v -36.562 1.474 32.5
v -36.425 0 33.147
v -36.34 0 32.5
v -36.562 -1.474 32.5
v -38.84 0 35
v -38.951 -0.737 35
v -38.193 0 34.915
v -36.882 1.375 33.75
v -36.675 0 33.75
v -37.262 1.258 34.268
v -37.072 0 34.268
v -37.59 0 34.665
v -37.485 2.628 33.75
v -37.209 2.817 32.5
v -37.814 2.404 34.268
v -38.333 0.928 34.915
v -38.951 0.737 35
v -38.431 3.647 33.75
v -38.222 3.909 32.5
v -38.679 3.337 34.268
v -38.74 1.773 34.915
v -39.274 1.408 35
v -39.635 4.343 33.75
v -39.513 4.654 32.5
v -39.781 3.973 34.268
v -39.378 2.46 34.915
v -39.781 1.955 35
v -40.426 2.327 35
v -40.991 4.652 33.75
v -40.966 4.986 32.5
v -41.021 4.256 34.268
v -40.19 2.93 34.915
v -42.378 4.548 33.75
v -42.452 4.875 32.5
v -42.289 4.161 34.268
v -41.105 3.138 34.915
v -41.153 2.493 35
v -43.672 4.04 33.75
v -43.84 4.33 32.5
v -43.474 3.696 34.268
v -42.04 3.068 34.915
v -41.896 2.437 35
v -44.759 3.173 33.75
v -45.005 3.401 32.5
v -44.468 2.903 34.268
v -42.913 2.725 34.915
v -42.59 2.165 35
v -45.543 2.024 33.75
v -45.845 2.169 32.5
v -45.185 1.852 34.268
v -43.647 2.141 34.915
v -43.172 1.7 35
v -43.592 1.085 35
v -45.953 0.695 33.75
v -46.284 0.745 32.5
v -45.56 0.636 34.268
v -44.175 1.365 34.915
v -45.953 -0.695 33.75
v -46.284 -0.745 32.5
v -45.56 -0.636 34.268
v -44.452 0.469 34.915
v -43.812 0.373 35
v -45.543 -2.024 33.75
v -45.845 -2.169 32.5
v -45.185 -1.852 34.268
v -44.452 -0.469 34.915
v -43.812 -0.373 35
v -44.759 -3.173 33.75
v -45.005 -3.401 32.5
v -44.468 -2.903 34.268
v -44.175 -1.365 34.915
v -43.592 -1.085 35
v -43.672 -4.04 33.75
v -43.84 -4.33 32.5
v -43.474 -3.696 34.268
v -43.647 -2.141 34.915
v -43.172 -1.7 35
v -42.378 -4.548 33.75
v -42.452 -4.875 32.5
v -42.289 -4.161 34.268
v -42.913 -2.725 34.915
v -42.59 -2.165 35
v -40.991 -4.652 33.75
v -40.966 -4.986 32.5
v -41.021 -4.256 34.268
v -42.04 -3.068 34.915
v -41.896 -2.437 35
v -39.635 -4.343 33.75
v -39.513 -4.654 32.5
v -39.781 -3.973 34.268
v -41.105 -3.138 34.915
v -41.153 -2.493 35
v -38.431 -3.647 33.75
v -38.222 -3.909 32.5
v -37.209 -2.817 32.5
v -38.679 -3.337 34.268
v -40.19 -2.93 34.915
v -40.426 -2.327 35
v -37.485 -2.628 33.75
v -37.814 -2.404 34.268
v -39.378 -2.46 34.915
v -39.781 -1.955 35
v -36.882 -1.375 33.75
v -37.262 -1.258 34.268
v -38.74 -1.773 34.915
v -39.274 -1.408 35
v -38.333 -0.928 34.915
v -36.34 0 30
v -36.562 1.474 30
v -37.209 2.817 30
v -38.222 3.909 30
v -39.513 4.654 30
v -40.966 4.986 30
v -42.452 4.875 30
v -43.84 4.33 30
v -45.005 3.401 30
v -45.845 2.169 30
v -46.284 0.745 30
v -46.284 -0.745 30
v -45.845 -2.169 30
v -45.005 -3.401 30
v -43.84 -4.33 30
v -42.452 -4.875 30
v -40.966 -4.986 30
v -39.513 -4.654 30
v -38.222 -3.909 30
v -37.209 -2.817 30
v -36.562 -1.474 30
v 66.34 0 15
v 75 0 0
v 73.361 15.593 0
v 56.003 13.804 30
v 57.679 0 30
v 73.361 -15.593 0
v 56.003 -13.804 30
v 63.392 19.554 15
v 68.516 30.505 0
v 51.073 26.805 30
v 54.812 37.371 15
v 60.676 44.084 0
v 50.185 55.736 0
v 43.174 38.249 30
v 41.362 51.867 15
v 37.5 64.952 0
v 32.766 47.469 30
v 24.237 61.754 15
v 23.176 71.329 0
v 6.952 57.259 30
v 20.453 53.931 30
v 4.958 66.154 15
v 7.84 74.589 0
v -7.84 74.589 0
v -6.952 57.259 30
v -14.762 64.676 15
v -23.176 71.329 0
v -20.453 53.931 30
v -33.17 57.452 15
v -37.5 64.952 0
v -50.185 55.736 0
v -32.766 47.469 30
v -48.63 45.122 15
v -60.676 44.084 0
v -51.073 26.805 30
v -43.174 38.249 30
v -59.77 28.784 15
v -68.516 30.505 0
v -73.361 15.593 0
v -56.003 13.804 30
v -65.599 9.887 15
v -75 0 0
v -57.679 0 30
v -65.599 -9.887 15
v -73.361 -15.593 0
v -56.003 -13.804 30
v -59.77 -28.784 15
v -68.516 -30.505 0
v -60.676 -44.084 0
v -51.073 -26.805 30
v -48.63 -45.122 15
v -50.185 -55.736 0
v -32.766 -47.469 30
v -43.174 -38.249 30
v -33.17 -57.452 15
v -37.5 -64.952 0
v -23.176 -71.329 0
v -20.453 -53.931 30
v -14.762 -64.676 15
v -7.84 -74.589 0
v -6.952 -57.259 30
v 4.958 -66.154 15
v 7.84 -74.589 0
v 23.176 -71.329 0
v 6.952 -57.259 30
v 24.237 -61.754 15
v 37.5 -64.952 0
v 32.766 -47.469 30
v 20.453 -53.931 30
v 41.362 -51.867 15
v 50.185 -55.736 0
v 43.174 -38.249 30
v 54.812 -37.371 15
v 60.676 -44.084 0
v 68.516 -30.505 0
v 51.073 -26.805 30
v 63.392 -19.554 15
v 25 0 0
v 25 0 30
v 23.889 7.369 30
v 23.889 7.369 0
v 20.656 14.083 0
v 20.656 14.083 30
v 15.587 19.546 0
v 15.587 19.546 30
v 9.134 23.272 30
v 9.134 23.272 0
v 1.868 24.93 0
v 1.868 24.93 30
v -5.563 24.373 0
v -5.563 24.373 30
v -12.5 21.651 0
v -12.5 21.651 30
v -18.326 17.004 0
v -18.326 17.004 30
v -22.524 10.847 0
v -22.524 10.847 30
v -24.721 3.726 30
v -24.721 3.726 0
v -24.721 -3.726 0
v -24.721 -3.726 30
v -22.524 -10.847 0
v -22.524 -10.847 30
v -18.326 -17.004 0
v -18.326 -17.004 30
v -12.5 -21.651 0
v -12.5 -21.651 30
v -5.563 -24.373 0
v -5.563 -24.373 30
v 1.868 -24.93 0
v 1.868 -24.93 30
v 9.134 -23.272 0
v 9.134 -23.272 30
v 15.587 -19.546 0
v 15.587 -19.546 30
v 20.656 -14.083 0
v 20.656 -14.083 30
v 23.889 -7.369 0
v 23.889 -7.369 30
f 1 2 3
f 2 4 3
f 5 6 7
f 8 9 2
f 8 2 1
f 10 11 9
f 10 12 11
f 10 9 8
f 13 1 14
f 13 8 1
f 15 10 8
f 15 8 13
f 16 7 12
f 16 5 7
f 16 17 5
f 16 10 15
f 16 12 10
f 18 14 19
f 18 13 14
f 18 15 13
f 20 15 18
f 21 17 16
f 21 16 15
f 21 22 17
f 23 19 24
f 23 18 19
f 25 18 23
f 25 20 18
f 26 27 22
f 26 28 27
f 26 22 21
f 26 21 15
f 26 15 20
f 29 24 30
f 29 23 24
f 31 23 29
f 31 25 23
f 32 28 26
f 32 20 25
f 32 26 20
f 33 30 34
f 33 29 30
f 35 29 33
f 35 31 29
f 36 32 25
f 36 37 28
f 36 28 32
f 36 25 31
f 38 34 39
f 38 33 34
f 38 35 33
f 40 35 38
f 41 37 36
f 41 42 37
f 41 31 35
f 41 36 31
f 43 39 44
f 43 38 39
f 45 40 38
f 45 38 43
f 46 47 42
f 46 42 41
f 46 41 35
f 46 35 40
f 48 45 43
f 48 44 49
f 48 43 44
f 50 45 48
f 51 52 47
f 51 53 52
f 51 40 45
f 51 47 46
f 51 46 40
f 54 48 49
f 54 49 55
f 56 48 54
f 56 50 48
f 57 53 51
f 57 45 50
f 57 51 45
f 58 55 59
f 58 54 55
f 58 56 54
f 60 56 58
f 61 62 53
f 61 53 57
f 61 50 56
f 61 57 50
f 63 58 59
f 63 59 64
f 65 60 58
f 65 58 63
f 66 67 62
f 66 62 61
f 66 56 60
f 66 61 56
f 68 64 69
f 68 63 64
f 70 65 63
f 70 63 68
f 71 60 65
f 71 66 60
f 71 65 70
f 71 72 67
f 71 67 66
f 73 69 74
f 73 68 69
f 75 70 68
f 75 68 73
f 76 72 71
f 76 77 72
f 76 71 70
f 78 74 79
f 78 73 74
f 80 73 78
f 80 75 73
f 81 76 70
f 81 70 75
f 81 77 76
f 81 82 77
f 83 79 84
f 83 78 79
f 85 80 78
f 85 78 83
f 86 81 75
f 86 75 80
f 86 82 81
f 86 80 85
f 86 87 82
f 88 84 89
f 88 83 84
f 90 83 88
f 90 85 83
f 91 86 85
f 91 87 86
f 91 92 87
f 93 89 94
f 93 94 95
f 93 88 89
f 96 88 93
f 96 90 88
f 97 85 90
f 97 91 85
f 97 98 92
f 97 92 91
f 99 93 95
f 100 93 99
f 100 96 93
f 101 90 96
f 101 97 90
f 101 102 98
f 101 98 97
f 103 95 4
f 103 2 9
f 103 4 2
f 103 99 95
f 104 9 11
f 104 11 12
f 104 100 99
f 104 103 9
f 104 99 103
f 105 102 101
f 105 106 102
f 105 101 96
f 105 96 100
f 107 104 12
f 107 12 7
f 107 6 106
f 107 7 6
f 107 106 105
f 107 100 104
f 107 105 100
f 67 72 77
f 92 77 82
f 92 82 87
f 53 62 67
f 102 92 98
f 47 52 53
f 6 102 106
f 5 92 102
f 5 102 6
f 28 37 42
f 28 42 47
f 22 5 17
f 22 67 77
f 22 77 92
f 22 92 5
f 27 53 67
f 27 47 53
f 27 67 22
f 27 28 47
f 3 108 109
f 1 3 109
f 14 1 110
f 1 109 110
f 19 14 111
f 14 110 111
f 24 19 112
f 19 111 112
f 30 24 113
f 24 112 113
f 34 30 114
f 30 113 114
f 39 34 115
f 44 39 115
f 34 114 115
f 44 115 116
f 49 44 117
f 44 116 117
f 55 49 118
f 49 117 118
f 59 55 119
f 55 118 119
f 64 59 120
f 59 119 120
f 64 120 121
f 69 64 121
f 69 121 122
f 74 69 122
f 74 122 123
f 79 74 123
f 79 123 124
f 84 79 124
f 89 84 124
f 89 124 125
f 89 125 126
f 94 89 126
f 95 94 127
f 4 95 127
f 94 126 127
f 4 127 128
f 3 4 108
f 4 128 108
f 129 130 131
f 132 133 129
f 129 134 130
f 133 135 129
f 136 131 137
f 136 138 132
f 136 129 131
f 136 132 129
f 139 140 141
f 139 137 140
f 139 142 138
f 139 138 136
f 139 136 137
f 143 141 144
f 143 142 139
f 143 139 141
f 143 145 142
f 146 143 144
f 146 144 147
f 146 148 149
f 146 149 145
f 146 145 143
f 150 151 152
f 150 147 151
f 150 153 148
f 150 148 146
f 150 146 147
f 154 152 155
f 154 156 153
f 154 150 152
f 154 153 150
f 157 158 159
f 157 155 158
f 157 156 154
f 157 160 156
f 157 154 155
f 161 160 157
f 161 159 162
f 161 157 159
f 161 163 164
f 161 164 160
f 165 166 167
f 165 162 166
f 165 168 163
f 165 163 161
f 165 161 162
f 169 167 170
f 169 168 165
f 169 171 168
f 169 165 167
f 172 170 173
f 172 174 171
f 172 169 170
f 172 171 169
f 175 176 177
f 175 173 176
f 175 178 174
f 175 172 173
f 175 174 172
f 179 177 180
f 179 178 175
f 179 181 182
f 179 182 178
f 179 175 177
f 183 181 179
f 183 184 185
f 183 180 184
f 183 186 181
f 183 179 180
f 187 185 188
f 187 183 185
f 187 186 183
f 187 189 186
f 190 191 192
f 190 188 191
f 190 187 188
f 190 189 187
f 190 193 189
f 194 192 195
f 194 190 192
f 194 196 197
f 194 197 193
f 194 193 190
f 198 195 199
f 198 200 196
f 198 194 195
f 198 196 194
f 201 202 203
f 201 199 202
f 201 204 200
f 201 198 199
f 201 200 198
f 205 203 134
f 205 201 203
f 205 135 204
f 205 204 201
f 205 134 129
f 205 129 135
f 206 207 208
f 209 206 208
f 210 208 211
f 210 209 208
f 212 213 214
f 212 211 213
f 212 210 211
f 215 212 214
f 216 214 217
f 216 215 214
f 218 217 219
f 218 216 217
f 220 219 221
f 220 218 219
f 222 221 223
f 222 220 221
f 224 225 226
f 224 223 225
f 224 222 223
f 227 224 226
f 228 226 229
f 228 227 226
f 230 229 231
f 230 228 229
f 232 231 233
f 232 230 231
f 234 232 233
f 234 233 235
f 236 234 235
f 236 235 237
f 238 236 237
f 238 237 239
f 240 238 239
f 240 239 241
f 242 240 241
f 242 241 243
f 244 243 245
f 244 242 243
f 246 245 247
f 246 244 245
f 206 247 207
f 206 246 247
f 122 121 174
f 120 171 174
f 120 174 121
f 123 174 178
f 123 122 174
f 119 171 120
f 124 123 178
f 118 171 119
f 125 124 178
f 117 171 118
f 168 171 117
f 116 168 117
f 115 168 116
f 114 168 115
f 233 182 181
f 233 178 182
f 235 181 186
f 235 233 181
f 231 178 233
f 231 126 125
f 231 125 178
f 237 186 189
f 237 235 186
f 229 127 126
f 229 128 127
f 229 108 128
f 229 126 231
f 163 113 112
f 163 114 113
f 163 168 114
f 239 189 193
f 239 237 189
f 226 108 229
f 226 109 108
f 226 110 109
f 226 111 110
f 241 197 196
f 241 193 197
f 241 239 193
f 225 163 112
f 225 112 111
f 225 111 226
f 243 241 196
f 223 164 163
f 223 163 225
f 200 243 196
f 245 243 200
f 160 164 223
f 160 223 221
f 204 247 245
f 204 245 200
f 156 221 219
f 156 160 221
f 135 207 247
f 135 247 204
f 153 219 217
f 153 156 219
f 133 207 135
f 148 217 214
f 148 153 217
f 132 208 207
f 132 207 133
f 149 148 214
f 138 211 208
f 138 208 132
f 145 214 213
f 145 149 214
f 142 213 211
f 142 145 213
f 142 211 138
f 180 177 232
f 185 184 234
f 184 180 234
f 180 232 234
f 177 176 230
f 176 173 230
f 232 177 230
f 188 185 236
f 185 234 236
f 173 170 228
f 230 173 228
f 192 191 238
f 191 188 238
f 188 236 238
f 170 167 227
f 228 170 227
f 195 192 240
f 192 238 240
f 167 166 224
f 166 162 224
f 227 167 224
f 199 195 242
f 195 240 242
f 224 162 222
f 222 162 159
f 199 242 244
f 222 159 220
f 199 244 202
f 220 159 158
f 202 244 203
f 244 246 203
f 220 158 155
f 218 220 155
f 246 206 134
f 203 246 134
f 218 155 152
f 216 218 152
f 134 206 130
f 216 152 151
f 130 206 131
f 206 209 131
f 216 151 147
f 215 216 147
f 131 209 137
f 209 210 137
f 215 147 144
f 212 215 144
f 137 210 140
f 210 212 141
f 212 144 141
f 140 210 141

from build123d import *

# Parameters (mm, degrees)
SKETCH_1_R               = 75
EXTRUDE_1_DEPTH          = 30
EXTRUDE_1_TAPER          = 30
CUT_EXTRUDE_1_DEPTH      = 111.227038425
CUT_EXTRUDE_1_DEPTH_BACK = 111.227038425
SKETCH_2_R               = 25
EXTRUDE_2_DEPTH          = 5
FILLET_1_R               = 2.5


with BuildPart() as part:
    # 스케치1 → 보스-돌출1 (new body)
    with BuildSketch(Plane.XY):
        Circle(SKETCH_1_R)
    extrude(amount=EXTRUDE_1_DEPTH, taper=EXTRUDE_1_TAPER)

    # 스케치2 → 컷-돌출1 (cut, two sides: drawn at the far end of the back side and taken through both)
    with BuildSketch(Plane.XY.offset(30).offset(-CUT_EXTRUDE_1_DEPTH_BACK)):
        Circle(SKETCH_2_R)
    extrude(amount=CUT_EXTRUDE_1_DEPTH + CUT_EXTRUDE_1_DEPTH_BACK, mode=Mode.SUBTRACT)

    # 스케치3 → 보스-돌출2 (add)
    with BuildSketch(Plane.XY.offset(30)):
        with BuildLine():
            ThreePointArc((-46.339745962, 0), (-41.339745962, -5), (-36.339745962, 0))
            Line((-36.339745962, 0), (-46.339745962, 0))
        make_face()
        with BuildLine():
            Line((-46.339745962, 0), (-36.339745962, 0))
            ThreePointArc((-36.339745962, 0), (-41.339745962, 5), (-46.339745962, 0))
        make_face()
    extrude(amount=EXTRUDE_2_DEPTH)

    # 필렛1
    fillet_1_edges = [part.edges().sort_by_distance(p)[0] for p in [
        (-46.339745962, 0, 35),
    ]]
    fillet(fillet_1_edges, radius=FILLET_1_R)


solid = part.part
